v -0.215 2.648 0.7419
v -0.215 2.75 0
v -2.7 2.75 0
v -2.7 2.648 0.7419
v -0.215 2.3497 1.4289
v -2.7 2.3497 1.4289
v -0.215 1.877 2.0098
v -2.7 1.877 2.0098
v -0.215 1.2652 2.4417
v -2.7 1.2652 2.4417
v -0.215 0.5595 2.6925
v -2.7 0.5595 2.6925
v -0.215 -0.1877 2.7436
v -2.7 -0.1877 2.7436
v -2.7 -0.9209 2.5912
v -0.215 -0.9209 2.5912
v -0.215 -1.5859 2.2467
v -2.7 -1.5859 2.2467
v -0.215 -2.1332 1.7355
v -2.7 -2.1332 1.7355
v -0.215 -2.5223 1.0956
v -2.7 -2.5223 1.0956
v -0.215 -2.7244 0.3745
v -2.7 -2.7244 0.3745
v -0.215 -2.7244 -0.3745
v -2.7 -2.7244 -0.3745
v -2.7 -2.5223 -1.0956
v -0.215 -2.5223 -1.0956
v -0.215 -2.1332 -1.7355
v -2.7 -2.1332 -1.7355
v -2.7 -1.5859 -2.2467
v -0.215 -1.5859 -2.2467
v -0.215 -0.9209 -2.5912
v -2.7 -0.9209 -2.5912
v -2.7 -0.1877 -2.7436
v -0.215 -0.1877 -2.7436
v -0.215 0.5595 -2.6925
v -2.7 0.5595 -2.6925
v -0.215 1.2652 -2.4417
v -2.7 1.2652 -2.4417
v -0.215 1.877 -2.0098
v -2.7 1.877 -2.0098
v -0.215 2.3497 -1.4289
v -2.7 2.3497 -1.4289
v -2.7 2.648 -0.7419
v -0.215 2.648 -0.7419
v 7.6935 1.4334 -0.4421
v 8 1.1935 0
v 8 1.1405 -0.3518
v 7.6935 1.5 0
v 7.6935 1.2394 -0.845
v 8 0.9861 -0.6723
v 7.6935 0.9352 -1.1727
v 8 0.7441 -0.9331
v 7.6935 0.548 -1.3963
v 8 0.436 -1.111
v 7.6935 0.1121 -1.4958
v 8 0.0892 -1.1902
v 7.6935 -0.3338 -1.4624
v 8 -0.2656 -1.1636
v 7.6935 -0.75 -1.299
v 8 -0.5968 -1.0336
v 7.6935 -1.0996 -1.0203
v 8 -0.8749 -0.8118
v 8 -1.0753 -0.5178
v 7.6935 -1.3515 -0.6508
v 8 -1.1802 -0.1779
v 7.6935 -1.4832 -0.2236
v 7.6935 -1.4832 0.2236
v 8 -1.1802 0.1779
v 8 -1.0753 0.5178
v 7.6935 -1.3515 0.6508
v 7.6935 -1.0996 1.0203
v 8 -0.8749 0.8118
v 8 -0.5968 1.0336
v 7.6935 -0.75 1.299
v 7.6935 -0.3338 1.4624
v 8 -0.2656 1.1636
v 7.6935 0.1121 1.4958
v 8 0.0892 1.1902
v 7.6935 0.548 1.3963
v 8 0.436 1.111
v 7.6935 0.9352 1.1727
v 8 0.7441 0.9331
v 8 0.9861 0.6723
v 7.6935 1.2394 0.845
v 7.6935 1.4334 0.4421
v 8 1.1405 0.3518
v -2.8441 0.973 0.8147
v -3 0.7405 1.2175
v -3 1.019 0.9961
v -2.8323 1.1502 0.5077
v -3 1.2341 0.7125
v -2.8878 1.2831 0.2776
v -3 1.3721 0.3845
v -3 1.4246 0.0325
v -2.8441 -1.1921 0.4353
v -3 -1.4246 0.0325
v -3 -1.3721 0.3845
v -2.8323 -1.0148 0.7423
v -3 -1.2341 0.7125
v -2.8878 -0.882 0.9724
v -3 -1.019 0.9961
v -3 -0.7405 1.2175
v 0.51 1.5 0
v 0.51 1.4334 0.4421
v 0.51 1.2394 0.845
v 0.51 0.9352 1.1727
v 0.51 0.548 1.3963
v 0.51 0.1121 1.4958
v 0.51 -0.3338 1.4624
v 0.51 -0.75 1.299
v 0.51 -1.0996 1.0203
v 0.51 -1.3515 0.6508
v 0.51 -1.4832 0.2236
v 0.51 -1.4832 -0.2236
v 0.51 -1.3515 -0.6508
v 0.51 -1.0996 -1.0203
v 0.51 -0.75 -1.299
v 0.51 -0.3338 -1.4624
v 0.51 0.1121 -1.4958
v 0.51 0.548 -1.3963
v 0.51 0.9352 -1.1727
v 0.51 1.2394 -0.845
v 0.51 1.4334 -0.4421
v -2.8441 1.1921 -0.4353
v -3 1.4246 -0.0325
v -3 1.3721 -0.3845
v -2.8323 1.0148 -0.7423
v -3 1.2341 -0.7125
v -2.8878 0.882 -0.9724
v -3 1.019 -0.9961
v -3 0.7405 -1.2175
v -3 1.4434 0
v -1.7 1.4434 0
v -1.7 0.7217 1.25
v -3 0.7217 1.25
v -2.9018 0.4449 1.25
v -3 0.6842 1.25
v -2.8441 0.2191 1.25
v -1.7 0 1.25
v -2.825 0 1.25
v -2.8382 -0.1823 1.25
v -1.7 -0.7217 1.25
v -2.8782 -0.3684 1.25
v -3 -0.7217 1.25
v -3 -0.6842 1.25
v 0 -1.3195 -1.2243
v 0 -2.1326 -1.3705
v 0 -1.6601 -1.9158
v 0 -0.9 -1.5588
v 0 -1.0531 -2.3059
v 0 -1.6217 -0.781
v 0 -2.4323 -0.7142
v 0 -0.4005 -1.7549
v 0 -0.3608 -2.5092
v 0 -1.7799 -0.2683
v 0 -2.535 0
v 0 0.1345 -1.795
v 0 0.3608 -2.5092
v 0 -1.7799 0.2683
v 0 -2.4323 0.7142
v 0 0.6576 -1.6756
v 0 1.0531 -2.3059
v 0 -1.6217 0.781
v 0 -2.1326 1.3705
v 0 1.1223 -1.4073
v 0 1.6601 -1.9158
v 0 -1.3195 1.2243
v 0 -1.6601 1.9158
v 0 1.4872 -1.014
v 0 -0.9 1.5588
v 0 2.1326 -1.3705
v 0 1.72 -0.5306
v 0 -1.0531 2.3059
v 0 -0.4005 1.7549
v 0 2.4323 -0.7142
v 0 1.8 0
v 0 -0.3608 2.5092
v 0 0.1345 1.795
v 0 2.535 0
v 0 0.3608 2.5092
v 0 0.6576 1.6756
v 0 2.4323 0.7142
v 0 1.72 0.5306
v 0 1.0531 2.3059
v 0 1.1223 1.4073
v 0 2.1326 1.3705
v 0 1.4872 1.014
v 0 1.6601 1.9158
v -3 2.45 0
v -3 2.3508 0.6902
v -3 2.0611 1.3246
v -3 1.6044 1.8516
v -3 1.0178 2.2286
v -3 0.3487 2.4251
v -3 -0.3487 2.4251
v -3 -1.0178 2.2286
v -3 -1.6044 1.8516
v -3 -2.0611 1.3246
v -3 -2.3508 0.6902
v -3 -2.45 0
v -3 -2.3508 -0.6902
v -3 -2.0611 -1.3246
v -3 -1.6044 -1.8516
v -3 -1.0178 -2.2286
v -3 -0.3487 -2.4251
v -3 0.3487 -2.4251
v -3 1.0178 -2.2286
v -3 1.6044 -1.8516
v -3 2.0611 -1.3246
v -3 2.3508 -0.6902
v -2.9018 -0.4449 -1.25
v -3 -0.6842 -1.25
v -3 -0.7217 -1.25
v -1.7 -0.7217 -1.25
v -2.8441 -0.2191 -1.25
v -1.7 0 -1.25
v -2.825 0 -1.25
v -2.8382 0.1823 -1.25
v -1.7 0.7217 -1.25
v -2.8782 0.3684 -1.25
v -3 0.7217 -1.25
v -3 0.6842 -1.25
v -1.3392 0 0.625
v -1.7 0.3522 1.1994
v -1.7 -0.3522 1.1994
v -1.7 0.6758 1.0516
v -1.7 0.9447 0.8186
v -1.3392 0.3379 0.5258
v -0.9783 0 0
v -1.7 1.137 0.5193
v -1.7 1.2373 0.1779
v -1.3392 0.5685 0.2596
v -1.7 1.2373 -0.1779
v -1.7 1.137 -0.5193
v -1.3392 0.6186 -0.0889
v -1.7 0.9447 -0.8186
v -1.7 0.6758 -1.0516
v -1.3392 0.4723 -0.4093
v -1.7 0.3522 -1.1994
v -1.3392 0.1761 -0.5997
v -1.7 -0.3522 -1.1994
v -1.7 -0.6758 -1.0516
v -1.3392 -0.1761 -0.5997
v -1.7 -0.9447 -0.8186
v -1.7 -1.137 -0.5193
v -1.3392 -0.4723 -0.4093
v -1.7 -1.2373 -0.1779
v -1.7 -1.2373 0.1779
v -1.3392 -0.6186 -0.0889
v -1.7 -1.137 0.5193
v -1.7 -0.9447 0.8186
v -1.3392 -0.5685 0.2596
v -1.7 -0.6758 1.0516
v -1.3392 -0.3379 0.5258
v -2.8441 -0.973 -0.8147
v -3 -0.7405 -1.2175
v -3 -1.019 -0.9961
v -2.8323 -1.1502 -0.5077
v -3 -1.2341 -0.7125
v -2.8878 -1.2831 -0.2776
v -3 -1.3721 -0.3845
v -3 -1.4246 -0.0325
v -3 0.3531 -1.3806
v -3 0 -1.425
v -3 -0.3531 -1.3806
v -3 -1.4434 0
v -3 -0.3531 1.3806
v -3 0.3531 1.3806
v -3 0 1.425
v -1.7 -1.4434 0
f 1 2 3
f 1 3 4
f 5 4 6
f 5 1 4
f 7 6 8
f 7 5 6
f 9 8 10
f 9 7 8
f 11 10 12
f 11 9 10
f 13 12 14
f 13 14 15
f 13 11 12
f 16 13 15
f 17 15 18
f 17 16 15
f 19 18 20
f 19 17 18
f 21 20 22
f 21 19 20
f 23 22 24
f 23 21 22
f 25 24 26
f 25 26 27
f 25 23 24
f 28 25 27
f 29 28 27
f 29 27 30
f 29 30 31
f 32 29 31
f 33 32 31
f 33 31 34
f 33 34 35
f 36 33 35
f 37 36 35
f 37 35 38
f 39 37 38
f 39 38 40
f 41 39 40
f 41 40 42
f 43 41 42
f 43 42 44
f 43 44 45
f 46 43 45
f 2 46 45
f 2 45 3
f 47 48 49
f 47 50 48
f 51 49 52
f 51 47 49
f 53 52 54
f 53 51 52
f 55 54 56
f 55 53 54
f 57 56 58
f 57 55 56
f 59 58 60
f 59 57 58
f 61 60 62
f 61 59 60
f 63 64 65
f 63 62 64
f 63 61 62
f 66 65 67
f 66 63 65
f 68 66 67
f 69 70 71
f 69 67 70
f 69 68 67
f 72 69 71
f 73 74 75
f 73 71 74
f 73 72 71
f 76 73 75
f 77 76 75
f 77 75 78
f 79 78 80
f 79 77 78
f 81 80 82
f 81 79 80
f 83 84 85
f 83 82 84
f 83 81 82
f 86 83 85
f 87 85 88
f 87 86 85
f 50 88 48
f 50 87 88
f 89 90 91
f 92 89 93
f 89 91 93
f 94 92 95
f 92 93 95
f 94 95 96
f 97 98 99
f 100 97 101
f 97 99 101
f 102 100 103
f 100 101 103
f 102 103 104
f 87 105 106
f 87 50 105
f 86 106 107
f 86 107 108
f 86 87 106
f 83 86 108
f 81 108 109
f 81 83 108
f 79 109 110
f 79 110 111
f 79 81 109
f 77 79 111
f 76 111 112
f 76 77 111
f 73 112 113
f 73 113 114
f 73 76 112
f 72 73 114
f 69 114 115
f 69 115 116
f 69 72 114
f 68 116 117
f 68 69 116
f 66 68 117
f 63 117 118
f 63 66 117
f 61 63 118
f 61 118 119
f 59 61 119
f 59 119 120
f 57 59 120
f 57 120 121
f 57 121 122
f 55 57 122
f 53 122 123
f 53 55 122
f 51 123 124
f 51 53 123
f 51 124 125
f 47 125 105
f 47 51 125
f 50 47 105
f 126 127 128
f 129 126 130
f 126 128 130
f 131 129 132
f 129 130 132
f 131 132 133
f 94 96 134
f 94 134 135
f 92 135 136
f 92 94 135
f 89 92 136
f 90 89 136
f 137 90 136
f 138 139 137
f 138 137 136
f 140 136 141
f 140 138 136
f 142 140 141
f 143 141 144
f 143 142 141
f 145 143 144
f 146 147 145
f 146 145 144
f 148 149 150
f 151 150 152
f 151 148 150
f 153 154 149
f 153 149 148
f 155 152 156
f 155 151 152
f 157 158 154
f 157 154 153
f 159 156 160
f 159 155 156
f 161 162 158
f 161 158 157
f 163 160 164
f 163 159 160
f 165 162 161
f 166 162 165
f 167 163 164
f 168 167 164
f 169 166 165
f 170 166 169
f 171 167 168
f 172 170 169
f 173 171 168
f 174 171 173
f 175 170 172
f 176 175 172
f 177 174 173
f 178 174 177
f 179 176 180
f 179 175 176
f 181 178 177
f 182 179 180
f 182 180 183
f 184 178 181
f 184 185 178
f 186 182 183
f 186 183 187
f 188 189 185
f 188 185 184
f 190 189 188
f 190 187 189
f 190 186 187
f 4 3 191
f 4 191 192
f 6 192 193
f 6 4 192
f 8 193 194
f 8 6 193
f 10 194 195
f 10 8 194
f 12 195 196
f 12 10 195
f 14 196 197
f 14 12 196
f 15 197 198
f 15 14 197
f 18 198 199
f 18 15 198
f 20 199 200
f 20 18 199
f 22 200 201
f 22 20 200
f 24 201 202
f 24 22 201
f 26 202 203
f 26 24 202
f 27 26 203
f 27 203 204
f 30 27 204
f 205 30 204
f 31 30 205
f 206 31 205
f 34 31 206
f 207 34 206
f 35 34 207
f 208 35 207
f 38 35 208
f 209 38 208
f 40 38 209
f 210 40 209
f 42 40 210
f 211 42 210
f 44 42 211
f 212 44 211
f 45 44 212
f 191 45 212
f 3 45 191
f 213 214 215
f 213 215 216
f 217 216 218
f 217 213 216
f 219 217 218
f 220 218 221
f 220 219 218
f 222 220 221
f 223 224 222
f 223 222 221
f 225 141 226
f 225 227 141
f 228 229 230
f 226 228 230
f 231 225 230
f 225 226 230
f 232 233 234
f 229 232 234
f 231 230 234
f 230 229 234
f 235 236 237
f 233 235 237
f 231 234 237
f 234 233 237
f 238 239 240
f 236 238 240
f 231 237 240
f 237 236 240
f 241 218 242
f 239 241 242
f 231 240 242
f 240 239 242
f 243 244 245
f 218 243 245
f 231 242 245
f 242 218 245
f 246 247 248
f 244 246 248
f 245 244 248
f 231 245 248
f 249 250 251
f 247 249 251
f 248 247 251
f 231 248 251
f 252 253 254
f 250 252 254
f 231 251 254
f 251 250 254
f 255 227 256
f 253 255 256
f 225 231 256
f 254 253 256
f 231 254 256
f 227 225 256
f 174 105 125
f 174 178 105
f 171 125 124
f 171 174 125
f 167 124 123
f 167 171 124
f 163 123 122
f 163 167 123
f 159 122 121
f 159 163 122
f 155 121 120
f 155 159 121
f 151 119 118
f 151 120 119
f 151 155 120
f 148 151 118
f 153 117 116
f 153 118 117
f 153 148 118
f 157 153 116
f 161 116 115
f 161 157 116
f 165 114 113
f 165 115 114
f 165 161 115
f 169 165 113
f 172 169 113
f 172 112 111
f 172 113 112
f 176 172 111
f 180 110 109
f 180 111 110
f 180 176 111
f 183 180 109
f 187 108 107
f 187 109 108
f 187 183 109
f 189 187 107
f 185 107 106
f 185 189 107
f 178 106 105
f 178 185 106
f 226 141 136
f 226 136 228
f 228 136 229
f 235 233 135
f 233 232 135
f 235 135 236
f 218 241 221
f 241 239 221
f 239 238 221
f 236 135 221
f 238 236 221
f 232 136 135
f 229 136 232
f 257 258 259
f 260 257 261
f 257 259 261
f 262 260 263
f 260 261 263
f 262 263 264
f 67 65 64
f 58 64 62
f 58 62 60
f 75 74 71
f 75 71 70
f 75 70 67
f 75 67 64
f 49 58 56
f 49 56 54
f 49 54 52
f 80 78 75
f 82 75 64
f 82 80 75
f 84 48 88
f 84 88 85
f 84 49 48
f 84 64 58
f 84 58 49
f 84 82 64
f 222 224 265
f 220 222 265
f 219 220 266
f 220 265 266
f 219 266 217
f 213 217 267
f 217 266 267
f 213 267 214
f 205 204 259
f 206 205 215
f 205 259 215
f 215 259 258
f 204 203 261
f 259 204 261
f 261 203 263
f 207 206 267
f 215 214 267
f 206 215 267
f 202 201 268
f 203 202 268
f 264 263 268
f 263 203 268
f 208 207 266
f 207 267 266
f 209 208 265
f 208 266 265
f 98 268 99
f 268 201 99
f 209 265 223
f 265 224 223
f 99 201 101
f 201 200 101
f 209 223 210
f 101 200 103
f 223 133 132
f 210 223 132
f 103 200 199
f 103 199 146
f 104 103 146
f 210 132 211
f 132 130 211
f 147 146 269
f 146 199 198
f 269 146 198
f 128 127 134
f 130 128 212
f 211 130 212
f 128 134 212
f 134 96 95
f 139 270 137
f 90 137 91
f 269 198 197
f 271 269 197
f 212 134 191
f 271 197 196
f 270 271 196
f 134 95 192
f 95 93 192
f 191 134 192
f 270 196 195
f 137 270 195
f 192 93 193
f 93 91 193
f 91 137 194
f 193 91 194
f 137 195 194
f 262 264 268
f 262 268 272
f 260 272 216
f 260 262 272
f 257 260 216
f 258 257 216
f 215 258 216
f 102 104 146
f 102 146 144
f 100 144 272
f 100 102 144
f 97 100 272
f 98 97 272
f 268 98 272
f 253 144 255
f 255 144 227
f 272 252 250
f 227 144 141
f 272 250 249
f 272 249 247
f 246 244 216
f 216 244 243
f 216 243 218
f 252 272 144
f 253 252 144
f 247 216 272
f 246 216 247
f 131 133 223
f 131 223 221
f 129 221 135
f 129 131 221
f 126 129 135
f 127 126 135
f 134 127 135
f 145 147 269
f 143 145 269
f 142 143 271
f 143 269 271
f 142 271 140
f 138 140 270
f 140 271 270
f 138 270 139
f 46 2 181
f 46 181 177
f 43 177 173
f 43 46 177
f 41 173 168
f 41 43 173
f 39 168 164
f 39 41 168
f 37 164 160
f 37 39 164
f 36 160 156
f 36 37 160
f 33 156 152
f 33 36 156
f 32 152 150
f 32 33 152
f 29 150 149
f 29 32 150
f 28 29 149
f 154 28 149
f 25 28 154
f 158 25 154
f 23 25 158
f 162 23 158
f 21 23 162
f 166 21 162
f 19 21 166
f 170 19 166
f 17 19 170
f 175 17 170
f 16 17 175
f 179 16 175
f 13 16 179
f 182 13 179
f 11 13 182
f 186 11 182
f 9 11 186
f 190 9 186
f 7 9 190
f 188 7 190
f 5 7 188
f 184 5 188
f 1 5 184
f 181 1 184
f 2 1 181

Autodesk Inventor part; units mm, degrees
sketch "Sketch_1" plane through (0, 0, 0) normal (0, 0, 1) x (1, 0, 0)
  line L0 (8, 0) -> (-3, 0)
  line L1 (-3, 0) -> (-3, 2.75)
  line L2 (-3, 2.75) -> (0, 2.75)
  line L3 (0, 2.75) -> (0, 1.8)
  line L4 (0, 1.8) -> (0.51, 1.5)
  line L5 (0.51, 1.5) -> (7.6935, 1.5)
  line L6 (7.6935, 1.5) -> (8, 1.1935)
  line L7 (8, 1.1935) -> (8, 0)
  line L8 (8, 0) -> (-3, 0)
revolve "Revolution1" add sketch "Sketch_1" angle 360 about axis through (8, 0, 0) along (1, 0, 0)
thread "Thread1" size "M3x0.5" class "6g" standard "ISO Metric profile" length 6.1935
sketch "Sketch_6" plane through (0, 0, 0) normal (0, 0, 1) x (1, 0, 0)
  line L0 (0, 0) -> (-3, 0)
  line L1 (-3, 3.3) -> (-3, 2.45)
  line L2 (-3, 2.45) -> (-2.7, 2.75)
  line L3 (-2.7, 2.75) -> (-0.215, 2.75)
  line L4 (-0.215, 2.75) -> (0, 2.535)
  line L5 (0, 2.535) -> (0, 3.3)
  line L6 (0, 3.3) -> (-3, 3.3)
revolve "Revolution2" cut sketch "Sketch_6" angle 360 about axis through (0, 0, 0) along (1, 0, 0)
sketch "Sketch3" plane through (-3, 0, 0) normal (-1, 0, 0) x (0, 0, 1)
  point P0 (0, 0)
hole "Hole1" at (-3, 0, 0) direction (1, 0, 0) diameter 2.5 depth 1.3 tip angle 120 countersink diameter 2.85 countersink angle 90
sketch "Sketch_2" plane through (-3, 0, 0) normal (1, 0, 0) x (0, 0, -1)
  line L0 (-1.25, -0.7217) -> (0, -1.4434)
  line L1 (0, -1.4434) -> (1.25, -0.7217)
  line L2 (1.25, -0.7217) -> (1.25, 0.7217)
  line L3 (1.25, 0.7217) -> (0, 1.4434)
  line L4 (0, 1.4434) -> (-1.25, 0.7217)
  line L5 (-1.25, 0.7217) -> (-1.25, -0.7217)
extrude "Extrusion1" cut sketch "Sketch_2" along normal mid plane 2.6
ref_plane "ANBAU_XY" through (0, 0, 0) normal (-1, 0, 0) x (0, 0, -1)
ref_plane "ANBAU_YZ" through (0, 0, 0) normal (0, 0, -1) x (0, -1, 0)
ref_plane "ANBAU_ZX" through (0, 0, 0) normal (0, -1, 0) x (-1, 0, 0)
ref_plane "IP1_XY" through (0, 0, 0) normal (1, 0, 0) x (0, 0, -1)
ref_plane "IP1_YZ" through (0, 0, 0) normal (0, 0, -1) x (0, 1, 0)
ref_plane "IP1_ZX" through (0, 0, 0) normal (0, 1, 0) x (1, 0, 0)
ref_plane "IP2_XY" through (-3, 0, 0) normal (1, 0, 0) x (0, 0, -1)
ref_plane "IP2_YZ" through (-3, 0, 0) normal (0, 0, -1) x (0, 1, 0)
ref_plane "IP2_ZX" through (-3, 0, 0) normal (0, 1, 0) x (1, 0, 0)
ref_plane "IP3_XY" through (8, 0, 0) normal (1, 0, 0) x (0, 0, -1)
ref_plane "IP3_YZ" through (8, 0, 0) normal (0, 0, -1) x (0, 1, 0)
ref_plane "IP3_ZX" through (8, 0, 0) normal (0, 1, 0) x (1, 0, 0)
properties part number "ISO-4762 M3x8"
